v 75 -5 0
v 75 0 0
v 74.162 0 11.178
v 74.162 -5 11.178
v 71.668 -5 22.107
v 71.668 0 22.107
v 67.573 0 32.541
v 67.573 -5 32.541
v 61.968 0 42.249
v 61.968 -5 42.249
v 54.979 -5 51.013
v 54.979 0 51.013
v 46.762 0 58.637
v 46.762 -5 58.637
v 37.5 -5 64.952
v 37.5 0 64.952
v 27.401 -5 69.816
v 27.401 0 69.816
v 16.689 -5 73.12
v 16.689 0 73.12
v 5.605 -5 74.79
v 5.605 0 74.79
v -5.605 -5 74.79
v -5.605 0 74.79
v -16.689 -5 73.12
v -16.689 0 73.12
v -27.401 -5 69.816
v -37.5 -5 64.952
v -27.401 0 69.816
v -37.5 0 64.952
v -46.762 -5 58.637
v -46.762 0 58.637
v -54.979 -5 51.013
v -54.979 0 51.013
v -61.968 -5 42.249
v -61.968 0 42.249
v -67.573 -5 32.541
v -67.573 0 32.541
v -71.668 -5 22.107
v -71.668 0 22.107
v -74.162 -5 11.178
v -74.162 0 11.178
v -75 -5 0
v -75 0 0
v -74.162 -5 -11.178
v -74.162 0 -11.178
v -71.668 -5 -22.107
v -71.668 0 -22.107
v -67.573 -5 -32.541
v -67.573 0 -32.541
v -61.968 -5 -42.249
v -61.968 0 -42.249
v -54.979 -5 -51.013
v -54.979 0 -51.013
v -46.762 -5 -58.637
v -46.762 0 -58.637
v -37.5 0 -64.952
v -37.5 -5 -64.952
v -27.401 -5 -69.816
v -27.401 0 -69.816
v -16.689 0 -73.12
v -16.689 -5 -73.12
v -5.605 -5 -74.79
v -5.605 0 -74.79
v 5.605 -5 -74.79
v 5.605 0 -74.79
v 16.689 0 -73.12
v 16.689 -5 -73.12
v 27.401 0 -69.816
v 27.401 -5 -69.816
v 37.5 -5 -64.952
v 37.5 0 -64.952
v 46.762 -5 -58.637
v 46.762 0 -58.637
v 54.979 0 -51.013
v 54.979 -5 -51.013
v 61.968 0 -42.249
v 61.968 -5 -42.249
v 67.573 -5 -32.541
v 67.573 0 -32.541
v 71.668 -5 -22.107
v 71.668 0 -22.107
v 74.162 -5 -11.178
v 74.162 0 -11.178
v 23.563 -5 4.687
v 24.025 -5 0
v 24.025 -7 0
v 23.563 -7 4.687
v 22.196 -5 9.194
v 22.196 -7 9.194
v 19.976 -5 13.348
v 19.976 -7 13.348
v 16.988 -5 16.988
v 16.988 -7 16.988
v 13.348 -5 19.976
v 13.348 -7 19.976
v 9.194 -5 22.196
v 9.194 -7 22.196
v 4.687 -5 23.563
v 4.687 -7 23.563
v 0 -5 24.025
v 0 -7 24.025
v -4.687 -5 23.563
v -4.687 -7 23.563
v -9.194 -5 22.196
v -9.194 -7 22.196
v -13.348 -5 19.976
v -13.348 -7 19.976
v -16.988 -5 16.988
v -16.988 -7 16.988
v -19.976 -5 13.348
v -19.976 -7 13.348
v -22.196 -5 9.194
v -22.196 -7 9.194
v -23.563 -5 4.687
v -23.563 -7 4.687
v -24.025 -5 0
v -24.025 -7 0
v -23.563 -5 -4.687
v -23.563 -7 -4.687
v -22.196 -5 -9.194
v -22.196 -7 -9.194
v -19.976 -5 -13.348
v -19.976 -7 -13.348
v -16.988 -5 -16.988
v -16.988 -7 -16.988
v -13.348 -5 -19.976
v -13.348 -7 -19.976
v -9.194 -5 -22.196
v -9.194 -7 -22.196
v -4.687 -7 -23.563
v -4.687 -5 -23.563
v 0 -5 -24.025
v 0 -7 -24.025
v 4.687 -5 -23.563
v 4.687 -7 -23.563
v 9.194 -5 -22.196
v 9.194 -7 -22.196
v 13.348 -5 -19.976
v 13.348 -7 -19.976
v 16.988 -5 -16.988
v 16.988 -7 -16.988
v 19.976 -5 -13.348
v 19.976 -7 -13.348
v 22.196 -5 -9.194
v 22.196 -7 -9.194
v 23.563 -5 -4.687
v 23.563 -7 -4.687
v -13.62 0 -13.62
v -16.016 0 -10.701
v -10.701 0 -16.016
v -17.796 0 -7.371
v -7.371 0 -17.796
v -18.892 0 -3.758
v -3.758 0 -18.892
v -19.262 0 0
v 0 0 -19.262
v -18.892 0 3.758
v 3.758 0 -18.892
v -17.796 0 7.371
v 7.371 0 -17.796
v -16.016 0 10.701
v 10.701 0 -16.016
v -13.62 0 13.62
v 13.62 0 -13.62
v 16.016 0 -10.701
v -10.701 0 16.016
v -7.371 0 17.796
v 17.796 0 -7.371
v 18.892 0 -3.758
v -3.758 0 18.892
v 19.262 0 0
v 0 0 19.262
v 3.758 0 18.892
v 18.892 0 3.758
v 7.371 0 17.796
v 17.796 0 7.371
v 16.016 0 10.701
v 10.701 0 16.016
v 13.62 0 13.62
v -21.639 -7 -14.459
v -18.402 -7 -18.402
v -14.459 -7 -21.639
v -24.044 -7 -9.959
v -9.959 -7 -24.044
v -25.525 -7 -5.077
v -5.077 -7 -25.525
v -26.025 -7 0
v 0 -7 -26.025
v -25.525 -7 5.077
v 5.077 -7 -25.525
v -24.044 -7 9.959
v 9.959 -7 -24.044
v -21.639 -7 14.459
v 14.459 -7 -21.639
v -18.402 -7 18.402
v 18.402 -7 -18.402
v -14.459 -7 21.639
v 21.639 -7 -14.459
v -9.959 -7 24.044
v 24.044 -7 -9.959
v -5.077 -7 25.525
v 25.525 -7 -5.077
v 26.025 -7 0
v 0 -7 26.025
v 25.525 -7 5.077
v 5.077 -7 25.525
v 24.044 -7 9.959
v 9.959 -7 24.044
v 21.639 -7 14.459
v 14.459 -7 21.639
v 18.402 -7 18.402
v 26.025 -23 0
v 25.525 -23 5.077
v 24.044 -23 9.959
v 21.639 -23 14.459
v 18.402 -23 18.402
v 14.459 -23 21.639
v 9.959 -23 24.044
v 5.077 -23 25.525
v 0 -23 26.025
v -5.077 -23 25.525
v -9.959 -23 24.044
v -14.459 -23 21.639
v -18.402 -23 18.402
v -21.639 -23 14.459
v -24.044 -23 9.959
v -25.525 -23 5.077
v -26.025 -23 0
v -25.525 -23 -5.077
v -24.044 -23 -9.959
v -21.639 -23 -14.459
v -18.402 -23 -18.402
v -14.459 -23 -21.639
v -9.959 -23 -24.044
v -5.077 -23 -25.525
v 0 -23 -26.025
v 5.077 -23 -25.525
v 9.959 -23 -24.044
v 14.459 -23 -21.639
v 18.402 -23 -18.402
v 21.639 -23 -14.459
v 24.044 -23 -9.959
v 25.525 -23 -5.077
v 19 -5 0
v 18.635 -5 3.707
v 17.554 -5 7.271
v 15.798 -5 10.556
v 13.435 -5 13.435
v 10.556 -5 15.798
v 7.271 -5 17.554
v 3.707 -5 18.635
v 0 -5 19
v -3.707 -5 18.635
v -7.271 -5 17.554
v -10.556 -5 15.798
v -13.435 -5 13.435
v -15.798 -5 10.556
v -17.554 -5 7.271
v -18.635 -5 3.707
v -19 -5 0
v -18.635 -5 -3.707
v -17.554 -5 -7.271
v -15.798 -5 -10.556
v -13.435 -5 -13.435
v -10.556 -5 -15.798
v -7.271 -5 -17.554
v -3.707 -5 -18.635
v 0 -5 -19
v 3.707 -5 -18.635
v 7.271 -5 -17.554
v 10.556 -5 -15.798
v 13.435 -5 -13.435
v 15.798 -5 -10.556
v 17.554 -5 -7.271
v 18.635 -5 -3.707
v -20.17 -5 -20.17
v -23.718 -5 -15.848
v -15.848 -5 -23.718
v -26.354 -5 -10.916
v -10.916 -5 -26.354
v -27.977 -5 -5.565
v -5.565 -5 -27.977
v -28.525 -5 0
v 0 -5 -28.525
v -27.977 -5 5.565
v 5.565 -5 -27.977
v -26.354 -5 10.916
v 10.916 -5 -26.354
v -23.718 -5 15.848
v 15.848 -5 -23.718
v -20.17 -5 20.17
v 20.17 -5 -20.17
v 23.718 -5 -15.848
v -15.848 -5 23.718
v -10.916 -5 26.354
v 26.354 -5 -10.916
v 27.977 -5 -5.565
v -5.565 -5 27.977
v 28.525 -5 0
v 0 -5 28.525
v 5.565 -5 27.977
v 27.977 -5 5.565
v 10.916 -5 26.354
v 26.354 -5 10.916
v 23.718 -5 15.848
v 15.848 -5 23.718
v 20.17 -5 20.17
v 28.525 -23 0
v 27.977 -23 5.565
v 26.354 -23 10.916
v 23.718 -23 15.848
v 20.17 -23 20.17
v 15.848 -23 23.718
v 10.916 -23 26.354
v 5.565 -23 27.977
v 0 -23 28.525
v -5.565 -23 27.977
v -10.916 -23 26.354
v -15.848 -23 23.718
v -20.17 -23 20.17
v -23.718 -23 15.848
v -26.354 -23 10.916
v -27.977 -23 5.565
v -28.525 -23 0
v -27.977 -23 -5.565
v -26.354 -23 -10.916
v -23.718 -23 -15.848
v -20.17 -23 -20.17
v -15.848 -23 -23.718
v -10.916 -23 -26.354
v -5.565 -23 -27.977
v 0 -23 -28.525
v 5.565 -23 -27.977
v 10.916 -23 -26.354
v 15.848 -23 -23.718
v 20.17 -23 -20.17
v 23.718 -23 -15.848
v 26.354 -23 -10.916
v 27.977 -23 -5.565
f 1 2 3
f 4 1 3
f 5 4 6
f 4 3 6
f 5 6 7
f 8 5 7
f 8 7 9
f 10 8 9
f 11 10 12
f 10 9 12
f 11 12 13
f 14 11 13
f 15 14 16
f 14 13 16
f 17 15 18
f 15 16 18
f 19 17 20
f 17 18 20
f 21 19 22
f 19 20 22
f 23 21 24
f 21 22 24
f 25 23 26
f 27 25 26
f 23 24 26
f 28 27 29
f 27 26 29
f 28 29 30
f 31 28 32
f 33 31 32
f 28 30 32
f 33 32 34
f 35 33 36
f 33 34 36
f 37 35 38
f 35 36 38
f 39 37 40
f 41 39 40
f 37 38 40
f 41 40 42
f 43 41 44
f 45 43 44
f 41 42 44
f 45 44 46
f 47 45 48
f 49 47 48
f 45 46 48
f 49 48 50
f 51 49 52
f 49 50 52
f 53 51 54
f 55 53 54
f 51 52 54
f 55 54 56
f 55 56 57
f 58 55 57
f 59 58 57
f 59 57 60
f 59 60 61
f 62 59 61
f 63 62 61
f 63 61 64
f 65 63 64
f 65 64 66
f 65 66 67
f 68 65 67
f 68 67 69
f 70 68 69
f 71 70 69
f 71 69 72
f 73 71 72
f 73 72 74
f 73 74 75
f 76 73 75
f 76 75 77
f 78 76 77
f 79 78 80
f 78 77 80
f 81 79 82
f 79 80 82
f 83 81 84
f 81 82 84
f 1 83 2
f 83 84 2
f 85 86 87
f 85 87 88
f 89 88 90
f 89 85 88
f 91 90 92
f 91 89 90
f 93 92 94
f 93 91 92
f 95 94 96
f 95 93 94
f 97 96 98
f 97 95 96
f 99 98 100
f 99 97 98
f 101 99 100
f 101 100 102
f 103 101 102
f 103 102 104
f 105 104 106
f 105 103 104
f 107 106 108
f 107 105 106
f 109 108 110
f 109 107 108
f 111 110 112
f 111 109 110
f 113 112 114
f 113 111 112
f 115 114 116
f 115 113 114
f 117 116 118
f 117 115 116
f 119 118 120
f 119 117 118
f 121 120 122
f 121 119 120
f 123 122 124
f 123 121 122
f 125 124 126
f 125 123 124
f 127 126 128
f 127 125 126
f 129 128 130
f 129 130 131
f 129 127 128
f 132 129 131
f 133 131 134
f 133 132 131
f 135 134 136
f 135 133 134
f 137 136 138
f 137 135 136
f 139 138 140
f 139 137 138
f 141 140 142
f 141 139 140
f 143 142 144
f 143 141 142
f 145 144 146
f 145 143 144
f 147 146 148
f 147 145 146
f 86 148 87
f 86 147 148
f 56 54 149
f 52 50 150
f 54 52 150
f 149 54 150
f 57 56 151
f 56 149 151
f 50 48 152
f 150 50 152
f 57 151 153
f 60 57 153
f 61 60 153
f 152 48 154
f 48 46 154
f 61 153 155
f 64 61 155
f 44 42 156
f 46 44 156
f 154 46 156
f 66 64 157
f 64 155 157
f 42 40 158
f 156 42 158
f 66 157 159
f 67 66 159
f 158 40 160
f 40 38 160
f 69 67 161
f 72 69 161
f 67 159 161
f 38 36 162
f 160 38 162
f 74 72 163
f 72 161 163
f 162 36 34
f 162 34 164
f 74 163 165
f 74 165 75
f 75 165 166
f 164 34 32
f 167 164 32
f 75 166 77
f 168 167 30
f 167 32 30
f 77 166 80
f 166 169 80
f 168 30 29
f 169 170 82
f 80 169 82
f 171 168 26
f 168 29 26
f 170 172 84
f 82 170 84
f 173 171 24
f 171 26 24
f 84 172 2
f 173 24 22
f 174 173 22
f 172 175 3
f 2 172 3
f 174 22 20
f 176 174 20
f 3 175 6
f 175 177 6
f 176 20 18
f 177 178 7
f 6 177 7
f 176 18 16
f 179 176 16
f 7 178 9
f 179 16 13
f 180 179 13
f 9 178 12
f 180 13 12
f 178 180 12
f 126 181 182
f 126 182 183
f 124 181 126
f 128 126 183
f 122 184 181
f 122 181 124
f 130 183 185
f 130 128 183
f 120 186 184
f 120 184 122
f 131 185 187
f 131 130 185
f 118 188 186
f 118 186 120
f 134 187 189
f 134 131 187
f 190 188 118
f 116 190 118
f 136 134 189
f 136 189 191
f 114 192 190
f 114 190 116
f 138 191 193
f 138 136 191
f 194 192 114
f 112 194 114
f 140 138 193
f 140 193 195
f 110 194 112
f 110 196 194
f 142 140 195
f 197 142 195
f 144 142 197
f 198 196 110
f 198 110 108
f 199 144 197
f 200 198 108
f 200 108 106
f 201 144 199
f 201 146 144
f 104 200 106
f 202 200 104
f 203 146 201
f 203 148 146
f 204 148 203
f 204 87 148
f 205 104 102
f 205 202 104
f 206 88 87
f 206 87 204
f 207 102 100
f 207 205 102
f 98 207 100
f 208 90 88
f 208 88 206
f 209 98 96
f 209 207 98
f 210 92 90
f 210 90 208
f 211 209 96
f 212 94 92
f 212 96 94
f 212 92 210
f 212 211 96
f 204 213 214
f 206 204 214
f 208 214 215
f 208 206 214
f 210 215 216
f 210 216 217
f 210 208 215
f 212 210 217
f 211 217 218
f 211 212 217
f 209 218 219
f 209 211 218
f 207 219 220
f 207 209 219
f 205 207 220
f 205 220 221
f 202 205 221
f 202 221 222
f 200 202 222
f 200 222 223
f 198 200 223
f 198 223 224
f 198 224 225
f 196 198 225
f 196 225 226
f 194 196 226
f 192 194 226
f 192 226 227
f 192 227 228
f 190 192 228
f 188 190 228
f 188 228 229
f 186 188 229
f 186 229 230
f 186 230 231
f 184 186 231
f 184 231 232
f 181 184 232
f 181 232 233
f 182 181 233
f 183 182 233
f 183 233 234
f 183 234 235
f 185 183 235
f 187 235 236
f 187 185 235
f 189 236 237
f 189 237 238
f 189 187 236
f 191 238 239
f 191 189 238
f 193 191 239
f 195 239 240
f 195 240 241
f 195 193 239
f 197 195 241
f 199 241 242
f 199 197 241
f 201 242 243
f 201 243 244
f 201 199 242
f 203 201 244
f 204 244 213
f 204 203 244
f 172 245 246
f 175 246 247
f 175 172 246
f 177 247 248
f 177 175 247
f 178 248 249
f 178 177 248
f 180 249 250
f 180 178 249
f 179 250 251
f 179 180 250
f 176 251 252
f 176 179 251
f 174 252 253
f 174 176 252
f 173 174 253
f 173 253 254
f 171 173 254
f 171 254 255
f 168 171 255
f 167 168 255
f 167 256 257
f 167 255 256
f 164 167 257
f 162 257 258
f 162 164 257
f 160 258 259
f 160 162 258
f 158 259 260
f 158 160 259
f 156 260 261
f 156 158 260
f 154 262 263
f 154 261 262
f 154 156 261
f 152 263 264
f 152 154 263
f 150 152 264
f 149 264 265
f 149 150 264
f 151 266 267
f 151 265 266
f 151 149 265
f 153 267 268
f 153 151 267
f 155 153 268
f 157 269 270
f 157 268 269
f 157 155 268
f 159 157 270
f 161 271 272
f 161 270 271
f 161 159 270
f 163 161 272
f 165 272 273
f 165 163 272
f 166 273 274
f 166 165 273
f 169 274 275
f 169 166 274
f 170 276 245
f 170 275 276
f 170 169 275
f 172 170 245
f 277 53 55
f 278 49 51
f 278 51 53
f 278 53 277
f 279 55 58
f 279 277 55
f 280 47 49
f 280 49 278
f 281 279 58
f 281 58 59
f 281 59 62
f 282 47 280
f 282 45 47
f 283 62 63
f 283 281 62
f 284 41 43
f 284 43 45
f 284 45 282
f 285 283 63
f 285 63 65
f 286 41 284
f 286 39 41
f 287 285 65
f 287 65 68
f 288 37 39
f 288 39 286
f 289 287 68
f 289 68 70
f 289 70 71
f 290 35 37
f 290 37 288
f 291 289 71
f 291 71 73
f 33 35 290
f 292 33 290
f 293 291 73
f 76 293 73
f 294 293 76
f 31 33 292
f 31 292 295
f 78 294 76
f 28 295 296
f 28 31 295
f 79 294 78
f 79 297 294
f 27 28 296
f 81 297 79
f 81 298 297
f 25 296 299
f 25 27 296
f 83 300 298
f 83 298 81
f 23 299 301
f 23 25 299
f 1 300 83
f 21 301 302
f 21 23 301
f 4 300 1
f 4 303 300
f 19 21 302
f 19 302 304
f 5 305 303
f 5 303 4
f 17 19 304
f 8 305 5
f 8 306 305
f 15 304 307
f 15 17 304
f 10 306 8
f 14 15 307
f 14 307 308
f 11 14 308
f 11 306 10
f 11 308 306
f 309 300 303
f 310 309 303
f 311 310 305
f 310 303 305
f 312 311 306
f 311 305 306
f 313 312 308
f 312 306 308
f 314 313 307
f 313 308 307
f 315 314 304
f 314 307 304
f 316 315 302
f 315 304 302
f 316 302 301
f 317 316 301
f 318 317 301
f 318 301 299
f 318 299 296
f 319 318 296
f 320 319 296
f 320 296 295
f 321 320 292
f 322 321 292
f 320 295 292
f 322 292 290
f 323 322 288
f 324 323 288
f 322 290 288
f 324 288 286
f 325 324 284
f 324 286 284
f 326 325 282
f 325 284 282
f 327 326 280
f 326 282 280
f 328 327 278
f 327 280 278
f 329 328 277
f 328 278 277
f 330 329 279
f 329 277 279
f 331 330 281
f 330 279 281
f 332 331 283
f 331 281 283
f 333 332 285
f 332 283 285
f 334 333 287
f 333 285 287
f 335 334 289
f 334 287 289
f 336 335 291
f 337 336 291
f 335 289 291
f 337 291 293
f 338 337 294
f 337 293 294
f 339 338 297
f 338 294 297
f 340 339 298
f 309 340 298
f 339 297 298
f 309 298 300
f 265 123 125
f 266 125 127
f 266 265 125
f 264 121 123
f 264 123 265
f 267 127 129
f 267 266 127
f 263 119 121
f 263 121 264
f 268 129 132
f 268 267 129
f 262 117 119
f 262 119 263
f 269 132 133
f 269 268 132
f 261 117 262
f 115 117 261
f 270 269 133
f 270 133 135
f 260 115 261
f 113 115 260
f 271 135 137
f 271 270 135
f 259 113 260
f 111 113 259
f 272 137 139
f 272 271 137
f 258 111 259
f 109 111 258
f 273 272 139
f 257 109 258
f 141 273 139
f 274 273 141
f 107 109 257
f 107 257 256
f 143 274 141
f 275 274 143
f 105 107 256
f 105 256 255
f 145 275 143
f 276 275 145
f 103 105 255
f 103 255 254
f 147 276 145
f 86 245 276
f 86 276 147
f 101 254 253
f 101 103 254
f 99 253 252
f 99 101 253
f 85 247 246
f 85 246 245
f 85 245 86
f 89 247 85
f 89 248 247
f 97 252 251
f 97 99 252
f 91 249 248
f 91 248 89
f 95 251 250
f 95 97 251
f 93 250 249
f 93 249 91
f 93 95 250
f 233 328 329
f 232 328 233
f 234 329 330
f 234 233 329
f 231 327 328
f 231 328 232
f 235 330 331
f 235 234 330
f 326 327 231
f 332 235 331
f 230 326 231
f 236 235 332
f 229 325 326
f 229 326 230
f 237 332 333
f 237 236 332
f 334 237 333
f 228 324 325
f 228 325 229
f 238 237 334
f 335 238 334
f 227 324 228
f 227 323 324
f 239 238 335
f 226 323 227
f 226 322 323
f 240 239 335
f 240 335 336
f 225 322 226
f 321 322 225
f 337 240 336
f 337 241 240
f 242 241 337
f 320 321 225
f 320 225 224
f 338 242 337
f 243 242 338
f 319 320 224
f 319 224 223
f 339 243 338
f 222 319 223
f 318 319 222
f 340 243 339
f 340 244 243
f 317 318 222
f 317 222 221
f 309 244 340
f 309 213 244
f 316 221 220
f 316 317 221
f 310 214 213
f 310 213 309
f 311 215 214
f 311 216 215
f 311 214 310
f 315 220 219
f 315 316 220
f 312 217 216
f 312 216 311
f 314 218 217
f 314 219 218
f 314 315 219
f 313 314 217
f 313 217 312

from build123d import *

# Parameters (mm, degrees)
F0_R     = 75
F1_DEPTH = 5
F2_R     = 19
F3_DEPTH = 5
F3_TAPER = -3
F4_R     = 28.525
F4_R_2   = 26.025
F5_DEPTH = 18
F6_R     = 26.025
F6_R_2   = 24.025
F7_DEPTH = 2


with BuildPart() as f1:
    # F0 (on Front) → F1 (new body)
    with BuildSketch(Plane.XZ):
        Circle(F0_R)
    extrude(amount=F1_DEPTH)

    # F2 (on face) → F3 (cut, through all)
    with BuildSketch(Plane.XZ.offset(5)):
        Circle(F2_R)
    extrude(amount=-F3_DEPTH, taper=F3_TAPER, mode=Mode.SUBTRACT)

    # F4 (on face) → F5 (join)
    with BuildSketch(Plane.XZ.offset(5)):
        Circle(F4_R)
        Circle(F4_R_2, mode=Mode.SUBTRACT)
    extrude(amount=F5_DEPTH)

    # F6 (on face) → F7 (join)
    with BuildSketch(Plane.XZ.offset(5)):
        Circle(F6_R)
        Circle(F6_R_2, mode=Mode.SUBTRACT)
    extrude(amount=F7_DEPTH)


solid = f1.part
